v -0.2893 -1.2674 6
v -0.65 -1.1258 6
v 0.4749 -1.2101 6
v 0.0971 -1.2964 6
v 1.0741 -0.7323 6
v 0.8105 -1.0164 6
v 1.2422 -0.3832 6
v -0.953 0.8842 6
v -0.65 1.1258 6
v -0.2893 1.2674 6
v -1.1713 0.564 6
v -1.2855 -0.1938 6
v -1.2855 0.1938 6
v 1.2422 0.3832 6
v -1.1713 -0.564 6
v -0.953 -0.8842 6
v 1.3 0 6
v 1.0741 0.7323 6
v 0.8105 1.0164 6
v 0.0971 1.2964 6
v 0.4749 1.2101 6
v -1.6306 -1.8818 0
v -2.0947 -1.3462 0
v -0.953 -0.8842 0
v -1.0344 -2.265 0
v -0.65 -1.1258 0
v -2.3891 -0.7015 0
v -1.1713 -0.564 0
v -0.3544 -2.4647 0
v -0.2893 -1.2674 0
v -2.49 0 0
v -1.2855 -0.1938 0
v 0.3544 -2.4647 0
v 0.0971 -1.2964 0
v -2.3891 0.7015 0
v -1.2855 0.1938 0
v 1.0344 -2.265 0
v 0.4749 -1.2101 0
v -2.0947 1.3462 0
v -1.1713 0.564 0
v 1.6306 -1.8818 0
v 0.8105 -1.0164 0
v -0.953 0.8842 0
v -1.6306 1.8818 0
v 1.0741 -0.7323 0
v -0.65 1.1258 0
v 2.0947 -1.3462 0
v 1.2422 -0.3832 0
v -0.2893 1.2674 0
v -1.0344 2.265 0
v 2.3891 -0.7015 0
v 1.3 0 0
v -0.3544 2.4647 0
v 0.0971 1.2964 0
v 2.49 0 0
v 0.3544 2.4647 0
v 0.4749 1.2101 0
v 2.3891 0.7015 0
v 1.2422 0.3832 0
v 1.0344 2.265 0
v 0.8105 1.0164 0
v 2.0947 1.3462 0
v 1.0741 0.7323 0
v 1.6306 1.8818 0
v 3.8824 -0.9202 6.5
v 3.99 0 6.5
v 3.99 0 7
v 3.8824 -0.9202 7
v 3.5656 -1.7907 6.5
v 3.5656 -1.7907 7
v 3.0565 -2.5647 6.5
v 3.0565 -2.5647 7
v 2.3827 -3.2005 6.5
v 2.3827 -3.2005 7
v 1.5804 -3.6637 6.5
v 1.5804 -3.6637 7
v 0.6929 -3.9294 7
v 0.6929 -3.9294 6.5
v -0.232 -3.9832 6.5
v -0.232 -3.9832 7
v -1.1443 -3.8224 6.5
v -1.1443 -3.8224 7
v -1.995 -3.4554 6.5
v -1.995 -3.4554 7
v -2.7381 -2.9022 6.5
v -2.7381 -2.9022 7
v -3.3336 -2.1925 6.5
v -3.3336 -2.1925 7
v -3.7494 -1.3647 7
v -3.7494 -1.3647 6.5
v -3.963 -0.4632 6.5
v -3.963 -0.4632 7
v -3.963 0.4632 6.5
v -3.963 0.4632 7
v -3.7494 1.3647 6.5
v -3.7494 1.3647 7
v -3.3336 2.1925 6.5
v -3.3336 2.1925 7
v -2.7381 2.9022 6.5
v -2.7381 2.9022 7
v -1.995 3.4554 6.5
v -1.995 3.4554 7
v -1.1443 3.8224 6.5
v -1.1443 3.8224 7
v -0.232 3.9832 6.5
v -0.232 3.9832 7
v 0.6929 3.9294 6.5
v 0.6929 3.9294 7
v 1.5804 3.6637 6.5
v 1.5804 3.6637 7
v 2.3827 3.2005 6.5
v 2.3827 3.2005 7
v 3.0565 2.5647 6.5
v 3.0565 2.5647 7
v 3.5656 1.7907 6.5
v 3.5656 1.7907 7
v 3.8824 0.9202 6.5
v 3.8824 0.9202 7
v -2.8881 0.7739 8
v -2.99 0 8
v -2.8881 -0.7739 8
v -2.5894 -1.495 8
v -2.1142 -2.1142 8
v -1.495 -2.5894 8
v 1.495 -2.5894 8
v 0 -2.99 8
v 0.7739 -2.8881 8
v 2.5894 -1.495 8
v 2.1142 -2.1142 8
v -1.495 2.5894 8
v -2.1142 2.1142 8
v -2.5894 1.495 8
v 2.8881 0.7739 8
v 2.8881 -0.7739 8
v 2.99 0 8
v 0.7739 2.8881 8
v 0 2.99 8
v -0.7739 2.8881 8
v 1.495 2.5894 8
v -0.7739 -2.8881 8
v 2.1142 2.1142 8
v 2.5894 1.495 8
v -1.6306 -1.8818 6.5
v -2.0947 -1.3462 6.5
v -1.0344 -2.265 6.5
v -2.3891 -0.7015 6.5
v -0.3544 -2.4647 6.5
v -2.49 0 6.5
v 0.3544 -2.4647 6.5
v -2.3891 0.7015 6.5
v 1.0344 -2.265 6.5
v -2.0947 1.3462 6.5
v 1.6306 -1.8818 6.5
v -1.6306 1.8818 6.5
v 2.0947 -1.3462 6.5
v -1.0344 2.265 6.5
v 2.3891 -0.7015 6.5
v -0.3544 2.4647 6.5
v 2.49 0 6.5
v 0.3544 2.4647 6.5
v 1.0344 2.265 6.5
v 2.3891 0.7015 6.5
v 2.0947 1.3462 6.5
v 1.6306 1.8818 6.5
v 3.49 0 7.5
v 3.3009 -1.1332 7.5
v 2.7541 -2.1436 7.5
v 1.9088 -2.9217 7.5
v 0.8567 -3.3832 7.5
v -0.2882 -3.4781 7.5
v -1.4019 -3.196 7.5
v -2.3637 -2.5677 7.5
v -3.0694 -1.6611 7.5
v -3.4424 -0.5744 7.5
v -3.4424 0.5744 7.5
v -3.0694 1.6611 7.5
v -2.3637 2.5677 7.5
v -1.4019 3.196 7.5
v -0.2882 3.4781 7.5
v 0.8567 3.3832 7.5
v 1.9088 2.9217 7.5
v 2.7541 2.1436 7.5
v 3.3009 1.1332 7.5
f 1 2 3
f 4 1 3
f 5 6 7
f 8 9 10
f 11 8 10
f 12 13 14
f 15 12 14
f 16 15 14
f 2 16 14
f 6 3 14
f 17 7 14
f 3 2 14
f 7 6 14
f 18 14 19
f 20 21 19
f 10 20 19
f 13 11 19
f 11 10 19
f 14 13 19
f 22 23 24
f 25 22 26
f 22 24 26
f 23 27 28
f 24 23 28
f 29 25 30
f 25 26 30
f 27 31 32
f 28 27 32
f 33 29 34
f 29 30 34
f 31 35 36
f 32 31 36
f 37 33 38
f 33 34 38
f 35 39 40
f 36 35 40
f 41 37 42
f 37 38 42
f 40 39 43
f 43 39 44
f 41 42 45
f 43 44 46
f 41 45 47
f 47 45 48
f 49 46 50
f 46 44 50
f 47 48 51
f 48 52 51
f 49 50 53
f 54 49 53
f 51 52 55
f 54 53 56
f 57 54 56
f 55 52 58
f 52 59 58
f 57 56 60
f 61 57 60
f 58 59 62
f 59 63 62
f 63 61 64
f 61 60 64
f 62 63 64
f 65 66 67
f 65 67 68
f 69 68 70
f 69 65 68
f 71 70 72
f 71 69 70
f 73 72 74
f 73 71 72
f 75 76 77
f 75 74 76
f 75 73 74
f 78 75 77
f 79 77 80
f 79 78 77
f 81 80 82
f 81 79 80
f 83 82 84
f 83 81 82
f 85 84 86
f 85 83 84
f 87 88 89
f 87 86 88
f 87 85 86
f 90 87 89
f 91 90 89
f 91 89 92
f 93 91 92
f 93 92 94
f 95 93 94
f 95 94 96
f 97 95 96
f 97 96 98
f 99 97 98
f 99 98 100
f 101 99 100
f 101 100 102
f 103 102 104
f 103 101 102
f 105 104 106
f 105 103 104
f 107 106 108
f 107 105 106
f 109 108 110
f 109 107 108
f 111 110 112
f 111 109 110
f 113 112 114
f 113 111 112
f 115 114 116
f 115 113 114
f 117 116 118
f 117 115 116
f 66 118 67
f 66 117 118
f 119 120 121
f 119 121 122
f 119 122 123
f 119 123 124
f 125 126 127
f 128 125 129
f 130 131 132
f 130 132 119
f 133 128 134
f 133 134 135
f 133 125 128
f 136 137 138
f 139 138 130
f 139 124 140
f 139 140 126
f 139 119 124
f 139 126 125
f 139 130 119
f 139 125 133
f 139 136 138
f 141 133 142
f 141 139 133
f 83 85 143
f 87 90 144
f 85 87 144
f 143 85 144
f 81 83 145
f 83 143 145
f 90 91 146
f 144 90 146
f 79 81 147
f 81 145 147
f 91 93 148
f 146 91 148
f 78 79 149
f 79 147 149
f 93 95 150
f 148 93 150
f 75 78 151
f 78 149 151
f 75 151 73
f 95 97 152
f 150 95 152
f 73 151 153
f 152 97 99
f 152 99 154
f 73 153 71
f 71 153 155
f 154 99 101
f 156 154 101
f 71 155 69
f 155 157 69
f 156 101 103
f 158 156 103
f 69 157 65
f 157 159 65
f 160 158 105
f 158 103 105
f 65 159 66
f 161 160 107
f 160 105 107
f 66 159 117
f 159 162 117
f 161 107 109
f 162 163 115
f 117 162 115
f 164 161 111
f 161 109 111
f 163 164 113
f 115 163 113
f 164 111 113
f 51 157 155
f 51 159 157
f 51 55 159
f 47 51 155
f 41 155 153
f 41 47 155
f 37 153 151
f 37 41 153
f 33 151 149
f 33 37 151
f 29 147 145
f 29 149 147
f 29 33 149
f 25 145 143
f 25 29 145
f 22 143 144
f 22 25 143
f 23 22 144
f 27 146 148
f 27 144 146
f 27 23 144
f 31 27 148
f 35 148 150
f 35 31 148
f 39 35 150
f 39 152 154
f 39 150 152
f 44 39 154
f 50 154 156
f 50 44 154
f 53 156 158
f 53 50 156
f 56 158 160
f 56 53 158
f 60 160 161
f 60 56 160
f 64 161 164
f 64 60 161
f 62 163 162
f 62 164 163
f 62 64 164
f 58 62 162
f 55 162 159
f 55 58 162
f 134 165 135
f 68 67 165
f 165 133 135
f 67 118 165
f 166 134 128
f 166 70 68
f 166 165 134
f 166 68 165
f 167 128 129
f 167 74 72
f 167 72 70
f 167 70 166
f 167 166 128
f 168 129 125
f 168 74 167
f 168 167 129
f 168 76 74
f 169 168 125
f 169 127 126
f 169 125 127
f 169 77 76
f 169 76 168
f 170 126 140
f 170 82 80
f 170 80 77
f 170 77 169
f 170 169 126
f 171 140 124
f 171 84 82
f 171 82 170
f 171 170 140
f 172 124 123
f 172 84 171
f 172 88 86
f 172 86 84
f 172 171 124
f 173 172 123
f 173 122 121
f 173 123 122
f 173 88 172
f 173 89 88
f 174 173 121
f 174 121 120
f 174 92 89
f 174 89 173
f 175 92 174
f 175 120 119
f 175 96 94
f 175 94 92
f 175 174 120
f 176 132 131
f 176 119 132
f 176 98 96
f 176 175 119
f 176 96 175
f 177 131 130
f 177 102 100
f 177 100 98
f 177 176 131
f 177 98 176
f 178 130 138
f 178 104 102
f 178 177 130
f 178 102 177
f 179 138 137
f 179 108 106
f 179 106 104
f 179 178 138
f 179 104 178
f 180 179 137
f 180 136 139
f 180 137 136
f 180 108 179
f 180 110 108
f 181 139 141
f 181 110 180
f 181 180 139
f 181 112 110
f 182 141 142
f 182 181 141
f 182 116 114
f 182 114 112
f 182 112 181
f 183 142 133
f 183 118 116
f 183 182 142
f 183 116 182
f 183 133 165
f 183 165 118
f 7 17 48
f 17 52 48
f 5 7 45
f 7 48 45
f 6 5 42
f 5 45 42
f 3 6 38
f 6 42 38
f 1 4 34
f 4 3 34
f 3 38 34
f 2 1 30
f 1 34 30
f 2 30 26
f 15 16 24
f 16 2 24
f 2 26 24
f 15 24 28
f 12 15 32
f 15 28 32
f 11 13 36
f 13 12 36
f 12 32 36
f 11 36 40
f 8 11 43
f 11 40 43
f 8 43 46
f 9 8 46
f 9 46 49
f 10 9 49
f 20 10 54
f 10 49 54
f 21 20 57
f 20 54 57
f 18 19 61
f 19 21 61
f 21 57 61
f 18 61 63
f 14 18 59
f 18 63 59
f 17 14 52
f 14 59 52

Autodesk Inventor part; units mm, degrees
ref_plane "YZ Plane" through (0, 0, 0) normal (1, 0, 0) x (0, 1, 0)
ref_plane "XZ Plane" through (0, 0, 0) normal (0, 1, 0) x (-1, 0, 0)
ref_plane "XY Plane" through (0, 0, 0) normal (0, 0, 1) x (1, 0, 0)
sketch "Sketch1" plane through (0, 0, 0) normal (0, 0, 1) x (1, 0, 0)
  circle A0 centre (0, 0) radius 1.3
  circle A1 centre (0, 0) radius 2.49
  dimension "d0" = 2.6
  dimension "d1" = 4.98
extrude "Extrusion1" add sketch "Sketch1" along normal blind 6.5 contours A0 | A1
sketch "Sketch2" plane through (0, 0, 6.5) normal (0, 0, 1) x (1, 0, 0)
  circle A0 centre (0, 0) radius 2.49
  circle A1 centre (0, 0) radius 3.99
  circle A2 centre (0, 0) radius 2.49 projected
  dimension "d4" = 1.5
extrude "Extrusion2" add sketch "Sketch2" along normal blind 1.5 contours A0 | A1
extrude "Extrusion3" cut sketch "Sketch1" along normal blind 6 contours A0
chamfer "Chamfer1" distance 1 angle 45 1 edges at (-3.99, 0, 8)
properties part number "steering_bolt"
